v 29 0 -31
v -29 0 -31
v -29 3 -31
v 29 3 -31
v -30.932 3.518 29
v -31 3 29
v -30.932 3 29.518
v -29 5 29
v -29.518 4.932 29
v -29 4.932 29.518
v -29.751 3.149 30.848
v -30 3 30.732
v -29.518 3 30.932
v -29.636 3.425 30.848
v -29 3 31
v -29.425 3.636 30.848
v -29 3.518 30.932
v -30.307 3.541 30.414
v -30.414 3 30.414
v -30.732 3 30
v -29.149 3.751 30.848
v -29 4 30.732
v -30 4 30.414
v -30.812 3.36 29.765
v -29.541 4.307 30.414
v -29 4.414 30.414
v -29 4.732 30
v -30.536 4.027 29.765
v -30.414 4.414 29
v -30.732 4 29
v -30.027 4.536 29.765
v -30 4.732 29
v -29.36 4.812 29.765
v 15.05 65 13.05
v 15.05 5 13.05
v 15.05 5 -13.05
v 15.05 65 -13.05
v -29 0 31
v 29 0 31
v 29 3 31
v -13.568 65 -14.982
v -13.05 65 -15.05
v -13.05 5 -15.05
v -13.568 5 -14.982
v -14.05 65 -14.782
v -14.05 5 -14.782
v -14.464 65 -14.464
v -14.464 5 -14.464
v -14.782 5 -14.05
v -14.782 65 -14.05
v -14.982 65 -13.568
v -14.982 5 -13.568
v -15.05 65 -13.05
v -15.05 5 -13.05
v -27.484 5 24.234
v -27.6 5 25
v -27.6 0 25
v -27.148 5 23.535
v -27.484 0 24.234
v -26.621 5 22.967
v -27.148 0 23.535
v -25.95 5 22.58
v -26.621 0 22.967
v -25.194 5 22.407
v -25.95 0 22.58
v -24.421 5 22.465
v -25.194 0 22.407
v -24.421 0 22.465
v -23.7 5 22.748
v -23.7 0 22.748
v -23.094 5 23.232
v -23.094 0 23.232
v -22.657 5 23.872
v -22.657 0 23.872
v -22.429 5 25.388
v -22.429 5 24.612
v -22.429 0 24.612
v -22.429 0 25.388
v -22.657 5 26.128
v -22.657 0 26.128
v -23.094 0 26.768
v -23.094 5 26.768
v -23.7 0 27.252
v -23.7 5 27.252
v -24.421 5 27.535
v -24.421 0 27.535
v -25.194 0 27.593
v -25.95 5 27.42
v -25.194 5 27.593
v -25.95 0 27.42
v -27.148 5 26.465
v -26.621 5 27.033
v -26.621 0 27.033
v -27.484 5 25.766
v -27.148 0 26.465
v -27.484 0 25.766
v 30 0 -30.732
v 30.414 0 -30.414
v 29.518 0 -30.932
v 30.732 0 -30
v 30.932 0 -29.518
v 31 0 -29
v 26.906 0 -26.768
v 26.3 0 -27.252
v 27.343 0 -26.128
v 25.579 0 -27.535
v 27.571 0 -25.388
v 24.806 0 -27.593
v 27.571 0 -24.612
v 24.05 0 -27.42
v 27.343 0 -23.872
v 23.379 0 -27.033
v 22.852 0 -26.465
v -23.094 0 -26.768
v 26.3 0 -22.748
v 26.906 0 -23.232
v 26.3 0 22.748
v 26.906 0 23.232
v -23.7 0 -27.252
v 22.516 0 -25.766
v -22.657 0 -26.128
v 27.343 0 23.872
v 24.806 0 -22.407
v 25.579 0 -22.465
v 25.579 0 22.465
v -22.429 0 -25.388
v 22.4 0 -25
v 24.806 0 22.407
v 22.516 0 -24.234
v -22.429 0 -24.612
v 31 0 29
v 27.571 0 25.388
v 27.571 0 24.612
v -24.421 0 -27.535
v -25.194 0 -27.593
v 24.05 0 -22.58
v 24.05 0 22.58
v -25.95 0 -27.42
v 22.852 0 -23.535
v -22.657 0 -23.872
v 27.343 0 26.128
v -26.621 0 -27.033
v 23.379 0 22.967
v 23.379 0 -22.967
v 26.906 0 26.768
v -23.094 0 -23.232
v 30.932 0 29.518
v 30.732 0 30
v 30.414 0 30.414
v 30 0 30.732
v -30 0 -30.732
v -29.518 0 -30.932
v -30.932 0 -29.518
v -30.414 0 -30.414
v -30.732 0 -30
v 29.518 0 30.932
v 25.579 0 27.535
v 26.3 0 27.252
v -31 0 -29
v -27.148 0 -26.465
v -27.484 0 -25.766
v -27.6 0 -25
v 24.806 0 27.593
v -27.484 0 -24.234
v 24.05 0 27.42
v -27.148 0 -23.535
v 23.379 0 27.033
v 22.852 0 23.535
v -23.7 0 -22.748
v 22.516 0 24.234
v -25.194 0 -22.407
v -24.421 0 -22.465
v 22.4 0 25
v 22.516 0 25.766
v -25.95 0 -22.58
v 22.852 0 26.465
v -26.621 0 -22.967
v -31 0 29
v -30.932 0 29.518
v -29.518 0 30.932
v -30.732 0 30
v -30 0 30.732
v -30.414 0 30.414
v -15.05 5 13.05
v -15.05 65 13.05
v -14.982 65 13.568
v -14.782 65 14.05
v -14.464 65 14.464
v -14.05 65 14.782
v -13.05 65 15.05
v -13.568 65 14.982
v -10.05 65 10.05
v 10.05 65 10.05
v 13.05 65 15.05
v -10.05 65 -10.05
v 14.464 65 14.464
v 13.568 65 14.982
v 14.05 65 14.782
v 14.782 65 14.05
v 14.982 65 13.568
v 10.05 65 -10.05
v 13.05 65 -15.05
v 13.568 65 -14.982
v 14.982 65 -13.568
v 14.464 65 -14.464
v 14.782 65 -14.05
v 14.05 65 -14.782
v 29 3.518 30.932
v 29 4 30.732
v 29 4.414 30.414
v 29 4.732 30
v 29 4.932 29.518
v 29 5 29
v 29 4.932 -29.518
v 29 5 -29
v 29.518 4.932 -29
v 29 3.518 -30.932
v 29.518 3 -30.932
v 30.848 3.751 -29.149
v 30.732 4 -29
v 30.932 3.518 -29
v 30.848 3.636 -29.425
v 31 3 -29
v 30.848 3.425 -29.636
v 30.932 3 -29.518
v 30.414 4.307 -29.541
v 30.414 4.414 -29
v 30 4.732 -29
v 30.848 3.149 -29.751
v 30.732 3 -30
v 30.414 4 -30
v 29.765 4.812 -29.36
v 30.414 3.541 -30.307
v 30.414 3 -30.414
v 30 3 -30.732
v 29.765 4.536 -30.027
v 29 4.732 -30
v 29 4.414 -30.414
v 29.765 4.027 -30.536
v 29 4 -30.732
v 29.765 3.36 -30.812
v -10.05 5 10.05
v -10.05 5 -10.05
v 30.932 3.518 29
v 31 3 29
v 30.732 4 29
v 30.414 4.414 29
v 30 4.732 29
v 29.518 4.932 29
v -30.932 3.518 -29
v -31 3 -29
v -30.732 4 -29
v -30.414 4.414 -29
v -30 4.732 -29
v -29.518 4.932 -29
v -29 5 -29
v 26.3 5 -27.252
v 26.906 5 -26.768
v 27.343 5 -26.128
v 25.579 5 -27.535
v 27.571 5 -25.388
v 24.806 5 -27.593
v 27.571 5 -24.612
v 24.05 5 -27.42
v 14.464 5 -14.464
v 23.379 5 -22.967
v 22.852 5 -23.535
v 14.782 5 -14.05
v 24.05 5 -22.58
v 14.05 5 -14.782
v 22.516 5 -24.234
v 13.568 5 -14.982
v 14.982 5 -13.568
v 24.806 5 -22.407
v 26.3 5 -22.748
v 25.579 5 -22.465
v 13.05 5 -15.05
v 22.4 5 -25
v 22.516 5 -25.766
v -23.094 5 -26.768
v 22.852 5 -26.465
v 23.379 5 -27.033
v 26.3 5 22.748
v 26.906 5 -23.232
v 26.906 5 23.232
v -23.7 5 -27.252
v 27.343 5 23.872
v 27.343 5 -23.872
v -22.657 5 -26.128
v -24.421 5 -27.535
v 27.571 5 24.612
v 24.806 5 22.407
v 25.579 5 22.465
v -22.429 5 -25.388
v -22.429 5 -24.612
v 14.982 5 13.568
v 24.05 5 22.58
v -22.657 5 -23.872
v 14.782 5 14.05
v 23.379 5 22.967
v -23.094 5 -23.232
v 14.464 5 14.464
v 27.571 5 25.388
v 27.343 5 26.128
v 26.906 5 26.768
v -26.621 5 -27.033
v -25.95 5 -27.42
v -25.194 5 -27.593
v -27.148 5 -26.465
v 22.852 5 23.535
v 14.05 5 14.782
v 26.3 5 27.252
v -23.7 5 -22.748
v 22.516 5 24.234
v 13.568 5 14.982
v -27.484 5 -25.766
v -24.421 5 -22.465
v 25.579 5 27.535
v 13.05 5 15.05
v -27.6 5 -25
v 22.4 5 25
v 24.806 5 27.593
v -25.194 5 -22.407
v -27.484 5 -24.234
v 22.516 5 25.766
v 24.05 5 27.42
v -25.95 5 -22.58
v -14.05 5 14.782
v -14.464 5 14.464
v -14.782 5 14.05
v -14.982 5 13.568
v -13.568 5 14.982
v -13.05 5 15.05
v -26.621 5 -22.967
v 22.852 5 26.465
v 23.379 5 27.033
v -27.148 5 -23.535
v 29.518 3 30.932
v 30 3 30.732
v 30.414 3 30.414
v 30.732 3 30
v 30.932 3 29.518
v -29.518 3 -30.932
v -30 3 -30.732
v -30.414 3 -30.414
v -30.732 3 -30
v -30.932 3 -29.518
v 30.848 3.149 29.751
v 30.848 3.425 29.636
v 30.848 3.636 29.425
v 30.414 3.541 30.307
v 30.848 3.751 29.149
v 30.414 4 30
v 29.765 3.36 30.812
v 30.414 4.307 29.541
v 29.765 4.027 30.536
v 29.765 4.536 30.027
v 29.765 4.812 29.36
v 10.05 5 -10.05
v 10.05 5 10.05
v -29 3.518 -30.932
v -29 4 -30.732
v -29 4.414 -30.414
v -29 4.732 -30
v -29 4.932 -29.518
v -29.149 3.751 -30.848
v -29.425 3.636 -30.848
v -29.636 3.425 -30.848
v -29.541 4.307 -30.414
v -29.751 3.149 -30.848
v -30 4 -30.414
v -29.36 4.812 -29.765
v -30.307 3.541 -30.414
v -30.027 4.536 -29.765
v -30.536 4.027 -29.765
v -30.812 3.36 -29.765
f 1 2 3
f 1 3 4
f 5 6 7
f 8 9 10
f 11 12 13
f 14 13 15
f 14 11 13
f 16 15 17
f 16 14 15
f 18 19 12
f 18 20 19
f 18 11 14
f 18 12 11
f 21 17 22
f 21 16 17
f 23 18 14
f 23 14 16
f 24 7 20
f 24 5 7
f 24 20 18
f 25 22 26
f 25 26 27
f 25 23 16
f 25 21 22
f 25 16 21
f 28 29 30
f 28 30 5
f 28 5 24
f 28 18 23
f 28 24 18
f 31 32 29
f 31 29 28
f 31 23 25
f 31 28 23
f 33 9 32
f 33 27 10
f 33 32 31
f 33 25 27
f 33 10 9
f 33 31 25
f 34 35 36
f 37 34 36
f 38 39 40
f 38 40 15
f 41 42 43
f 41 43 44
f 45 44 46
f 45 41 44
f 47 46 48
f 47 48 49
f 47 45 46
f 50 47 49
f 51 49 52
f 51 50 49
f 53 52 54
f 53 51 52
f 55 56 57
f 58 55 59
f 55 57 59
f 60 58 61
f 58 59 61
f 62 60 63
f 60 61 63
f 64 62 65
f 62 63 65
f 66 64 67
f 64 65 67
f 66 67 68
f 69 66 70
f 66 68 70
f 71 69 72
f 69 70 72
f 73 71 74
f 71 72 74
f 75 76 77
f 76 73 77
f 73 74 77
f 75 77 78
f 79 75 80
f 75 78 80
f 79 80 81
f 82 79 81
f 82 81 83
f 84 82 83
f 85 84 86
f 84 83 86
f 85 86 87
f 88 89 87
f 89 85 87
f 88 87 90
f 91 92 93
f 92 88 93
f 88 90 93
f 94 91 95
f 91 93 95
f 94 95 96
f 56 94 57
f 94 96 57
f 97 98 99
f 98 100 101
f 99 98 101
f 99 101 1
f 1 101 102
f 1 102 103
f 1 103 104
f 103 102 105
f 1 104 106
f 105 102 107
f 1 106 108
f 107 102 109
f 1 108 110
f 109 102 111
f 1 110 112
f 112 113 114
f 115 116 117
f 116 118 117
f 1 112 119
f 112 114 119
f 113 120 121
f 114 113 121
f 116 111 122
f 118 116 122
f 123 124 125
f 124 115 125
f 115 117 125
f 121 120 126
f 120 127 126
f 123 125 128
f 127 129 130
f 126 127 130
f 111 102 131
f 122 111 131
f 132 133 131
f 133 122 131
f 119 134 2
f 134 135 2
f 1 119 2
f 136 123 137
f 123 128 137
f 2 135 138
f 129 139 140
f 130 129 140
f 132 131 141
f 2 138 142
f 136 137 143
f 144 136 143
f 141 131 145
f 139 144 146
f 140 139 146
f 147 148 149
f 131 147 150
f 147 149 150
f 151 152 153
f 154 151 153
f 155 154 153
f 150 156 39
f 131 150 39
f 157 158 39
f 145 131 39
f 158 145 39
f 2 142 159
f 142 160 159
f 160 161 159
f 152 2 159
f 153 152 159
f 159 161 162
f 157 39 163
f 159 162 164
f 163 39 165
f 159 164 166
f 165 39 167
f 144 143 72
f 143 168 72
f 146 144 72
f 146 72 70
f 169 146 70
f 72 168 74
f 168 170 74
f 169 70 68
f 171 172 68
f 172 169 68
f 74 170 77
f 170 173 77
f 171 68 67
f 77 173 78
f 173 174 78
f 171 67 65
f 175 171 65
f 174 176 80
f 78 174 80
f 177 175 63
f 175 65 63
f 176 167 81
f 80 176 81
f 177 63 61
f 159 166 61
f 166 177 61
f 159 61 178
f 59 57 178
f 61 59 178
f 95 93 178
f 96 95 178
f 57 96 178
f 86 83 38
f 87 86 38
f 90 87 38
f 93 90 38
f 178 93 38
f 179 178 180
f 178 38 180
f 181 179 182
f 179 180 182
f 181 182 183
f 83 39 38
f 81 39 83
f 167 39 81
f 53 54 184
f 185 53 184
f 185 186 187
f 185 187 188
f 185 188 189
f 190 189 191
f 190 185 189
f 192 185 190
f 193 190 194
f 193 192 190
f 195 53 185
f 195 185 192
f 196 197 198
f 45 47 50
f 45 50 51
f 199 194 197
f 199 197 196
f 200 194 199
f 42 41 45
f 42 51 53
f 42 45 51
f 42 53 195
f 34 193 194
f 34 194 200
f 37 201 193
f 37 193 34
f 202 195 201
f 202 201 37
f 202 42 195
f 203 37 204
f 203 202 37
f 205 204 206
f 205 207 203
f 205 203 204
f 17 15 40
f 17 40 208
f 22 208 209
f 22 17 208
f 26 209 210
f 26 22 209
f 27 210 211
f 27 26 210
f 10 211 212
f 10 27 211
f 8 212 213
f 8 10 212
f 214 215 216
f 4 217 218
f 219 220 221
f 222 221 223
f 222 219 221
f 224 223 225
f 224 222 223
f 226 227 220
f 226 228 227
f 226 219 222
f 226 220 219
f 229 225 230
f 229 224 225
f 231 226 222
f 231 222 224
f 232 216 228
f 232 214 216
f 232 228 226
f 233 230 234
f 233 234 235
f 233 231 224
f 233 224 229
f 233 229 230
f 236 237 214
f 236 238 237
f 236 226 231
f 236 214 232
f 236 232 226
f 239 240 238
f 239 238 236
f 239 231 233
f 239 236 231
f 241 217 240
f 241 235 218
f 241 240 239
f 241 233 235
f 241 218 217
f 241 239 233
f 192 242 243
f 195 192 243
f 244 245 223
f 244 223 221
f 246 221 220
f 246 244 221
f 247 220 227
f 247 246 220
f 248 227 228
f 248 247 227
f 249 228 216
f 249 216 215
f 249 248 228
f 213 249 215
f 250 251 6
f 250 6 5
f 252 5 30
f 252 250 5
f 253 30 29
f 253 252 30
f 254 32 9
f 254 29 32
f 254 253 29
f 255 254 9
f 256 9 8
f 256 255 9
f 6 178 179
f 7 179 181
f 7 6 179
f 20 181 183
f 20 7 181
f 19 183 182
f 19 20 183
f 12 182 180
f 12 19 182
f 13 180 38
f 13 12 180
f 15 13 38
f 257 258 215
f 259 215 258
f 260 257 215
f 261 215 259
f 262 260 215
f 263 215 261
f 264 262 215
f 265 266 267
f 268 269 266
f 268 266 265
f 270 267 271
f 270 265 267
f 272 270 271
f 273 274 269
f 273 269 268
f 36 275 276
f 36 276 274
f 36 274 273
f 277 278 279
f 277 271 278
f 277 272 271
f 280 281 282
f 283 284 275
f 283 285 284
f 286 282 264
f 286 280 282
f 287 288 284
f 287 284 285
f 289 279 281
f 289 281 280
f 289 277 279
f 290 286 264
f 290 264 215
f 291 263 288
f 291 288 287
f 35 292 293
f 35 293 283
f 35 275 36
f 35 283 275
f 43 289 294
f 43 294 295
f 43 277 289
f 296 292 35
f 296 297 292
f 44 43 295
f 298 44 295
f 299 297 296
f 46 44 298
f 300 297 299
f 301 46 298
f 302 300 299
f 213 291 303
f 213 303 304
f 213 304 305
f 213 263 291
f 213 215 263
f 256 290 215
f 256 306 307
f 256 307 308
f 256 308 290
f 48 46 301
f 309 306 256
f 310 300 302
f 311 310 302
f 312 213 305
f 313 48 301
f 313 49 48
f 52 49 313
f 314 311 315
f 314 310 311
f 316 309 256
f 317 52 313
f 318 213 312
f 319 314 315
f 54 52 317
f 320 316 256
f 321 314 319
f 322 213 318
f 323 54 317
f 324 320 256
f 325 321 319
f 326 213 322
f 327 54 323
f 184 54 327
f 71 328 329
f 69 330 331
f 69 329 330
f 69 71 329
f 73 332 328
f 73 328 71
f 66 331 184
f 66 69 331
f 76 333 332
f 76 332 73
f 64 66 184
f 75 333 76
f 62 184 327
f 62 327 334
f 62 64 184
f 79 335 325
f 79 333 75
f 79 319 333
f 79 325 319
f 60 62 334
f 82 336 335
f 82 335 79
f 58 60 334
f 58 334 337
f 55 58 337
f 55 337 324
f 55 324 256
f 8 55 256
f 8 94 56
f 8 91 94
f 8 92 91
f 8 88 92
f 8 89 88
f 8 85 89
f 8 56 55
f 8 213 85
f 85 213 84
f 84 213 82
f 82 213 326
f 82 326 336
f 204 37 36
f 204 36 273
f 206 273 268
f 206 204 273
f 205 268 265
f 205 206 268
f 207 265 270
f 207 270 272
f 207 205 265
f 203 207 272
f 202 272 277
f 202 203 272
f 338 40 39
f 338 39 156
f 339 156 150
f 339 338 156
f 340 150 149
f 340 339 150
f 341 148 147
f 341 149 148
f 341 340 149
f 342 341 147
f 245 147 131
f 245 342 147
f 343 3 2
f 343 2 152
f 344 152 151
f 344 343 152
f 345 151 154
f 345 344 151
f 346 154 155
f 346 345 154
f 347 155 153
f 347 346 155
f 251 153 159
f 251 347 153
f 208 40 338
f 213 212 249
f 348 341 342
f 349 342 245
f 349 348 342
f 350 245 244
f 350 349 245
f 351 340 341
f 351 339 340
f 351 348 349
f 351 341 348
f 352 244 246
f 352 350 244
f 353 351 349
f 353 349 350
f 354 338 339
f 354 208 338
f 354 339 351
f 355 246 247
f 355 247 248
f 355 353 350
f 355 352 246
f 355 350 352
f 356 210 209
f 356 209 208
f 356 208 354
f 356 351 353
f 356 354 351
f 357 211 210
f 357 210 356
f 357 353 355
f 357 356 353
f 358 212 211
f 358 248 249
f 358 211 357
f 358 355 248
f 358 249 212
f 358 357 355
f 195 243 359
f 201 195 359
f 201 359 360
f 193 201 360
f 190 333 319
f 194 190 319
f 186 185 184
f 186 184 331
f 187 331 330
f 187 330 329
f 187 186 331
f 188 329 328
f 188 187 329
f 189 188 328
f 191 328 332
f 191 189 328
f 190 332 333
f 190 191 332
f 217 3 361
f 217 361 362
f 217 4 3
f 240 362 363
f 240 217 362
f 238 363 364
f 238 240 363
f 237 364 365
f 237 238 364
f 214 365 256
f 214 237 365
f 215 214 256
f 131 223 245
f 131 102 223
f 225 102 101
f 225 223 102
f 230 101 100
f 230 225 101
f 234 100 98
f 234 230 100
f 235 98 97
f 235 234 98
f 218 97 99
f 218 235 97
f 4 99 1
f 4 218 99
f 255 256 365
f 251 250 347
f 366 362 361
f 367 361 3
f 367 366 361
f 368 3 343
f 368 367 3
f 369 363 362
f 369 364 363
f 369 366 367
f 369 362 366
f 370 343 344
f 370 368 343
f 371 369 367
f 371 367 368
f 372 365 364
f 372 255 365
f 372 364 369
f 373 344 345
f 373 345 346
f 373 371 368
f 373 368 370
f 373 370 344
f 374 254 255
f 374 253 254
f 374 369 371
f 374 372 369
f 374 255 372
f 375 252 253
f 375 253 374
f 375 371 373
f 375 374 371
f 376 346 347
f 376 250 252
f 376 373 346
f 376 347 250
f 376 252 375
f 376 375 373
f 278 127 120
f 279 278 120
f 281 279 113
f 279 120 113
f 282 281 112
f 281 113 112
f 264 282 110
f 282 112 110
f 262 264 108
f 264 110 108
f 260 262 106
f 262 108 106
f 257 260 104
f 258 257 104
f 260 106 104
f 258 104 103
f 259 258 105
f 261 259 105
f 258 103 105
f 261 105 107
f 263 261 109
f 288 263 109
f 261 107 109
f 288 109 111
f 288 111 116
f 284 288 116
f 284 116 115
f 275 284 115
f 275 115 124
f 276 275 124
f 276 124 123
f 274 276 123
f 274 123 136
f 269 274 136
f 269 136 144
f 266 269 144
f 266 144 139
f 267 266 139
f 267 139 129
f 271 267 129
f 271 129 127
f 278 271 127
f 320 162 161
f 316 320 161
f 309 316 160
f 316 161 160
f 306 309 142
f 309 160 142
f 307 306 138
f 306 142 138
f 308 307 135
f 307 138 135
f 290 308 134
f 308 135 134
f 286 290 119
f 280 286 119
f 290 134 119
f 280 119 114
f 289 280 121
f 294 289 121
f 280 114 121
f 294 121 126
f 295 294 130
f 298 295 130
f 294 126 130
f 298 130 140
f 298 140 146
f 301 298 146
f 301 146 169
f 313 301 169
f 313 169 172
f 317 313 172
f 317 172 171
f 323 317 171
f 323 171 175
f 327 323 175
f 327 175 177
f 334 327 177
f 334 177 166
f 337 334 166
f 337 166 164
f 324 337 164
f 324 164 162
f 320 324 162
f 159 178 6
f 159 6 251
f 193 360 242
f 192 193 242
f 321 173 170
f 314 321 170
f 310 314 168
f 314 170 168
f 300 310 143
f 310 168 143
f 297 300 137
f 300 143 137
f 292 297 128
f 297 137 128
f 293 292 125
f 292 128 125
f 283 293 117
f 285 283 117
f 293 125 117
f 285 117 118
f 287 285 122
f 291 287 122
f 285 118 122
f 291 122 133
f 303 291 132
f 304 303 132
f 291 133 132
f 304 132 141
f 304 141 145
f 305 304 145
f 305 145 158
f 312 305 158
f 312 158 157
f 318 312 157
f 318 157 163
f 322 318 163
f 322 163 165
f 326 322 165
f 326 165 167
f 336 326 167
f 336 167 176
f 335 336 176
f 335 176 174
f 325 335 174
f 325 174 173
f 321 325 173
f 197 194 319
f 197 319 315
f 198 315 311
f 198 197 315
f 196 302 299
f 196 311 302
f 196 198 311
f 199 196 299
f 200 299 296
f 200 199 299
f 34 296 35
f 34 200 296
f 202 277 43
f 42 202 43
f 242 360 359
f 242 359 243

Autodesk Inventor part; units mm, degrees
ref_plane "YZ Plane" through (0, 0, 0) normal (1, 0, 0) x (0, 1, 0)
ref_plane "XZ Plane" through (0, 0, 0) normal (0, 1, 0) x (-1, 0, 0)
ref_plane "XY Plane" through (0, 0, 0) normal (0, 0, 1) x (1, 0, 0)
sketch "스케치2" plane through (0, 0, 0) normal (0, 1, 0) x (-1, 0, 0)
  line L0 (25, 25) -> (-25, 25)
  line L1 (-25, 25) -> (-25, -25)
  line L2 (-25, -25) -> (25, -25)
  line L3 (25, -25) -> (25, 25)
  line L4 (25, 25) -> (-25, -25) construction
  line L5 (-25, 25) -> (25, -25) construction
  circle A0 centre (25, -25) radius 2.6
  circle A1 centre (-25, -25) radius 2.6
  circle A2 centre (25, 25) radius 2.6
  circle A3 centre (-25, 25) radius 2.6
  line L6 (31, -31) -> (-31, -31)
  line L7 (-31, -31) -> (-31, 31)
  line L8 (-31, 31) -> (31, 31)
  line L9 (31, 31) -> (31, -31)
  line L10 (10.05, 10.05) -> (-10.05, 10.05)
  line L11 (-10.05, 10.05) -> (-10.05, -10.05)
  line L12 (-10.05, -10.05) -> (10.05, -10.05)
  line L13 (10.05, -10.05) -> (10.05, 10.05)
  line L14 (10.05, 10.05) -> (-10.05, -10.05) construction
  line L15 (-10.05, 10.05) -> (10.05, -10.05) construction
  line L16 (-15.05, -15.05) -> (-15.05, 15.05)
  line L17 (-15.05, 15.05) -> (15.05, 15.05)
  line L18 (15.05, 15.05) -> (15.05, -15.05)
  line L19 (15.05, -15.05) -> (-15.05, -15.05)
  point P0 (0, 0)
  dimension "d16" = 50
  dimension "d17" = 50
  dimension "d18" = 5.2
  dimension "d21" = 50
  dimension "d24" = 50
  dimension "d27" = 6
  dimension "d28" = 20.1
  dimension "d29" = 20.1
  dimension "d30" = 5
extrude "돌출2" add sketch "스케치2" along normal blind 5 contours L0 A2 L3 A0 L2 A1 L1 A3 | L6 L7 L8 L9 | L13 L12 L11 L10 | L16 L17 L18 L19
sketch "스케치3" plane through (0, 5, 0) normal (0, 1, 0) x (1, 0, 0)
  line L0 (-10.05, 10.05) -> (10.05, 10.05)
  line L1 (10.05, 10.05) -> (10.05, -10.05)
  line L2 (10.05, -10.05) -> (-10.05, -10.05)
  line L3 (-10.05, -10.05) -> (-10.05, 10.05)
  line L4 (-10.05, 10.05) -> (10.05, -10.05) construction
  line L5 (10.05, 10.05) -> (-10.05, -10.05) construction
  line L6 (15.05, 15.05) -> (-15.05, 15.05)
  line L7 (-15.05, 15.05) -> (-15.05, -15.05)
  line L8 (-15.05, -15.05) -> (15.05, -15.05)
  line L9 (15.05, -15.05) -> (15.05, 15.05)
  point P0 (0, 0)
  dimension "d33" = 20.1
  dimension "d34" = 20.1
  dimension "d35" = 5
extrude "돌출3" add sketch "스케치3" along normal blind 60
fillet "모깎기1" radius 2 12 edges at (-31, 5, 0) (0, 5, -31) (0, 5, 31) (31, 5, 0) (-31, 2.5, -31) (-31, 2.5, 31) (31, 2.5, 31) (31, 2.5, -31) (-15.05, 35, 15.05) (15.05, 35, 15.05) (15.05, 35, -15.05) (-15.05, 35, -15.05)
properties part number "Profile_Holder"
